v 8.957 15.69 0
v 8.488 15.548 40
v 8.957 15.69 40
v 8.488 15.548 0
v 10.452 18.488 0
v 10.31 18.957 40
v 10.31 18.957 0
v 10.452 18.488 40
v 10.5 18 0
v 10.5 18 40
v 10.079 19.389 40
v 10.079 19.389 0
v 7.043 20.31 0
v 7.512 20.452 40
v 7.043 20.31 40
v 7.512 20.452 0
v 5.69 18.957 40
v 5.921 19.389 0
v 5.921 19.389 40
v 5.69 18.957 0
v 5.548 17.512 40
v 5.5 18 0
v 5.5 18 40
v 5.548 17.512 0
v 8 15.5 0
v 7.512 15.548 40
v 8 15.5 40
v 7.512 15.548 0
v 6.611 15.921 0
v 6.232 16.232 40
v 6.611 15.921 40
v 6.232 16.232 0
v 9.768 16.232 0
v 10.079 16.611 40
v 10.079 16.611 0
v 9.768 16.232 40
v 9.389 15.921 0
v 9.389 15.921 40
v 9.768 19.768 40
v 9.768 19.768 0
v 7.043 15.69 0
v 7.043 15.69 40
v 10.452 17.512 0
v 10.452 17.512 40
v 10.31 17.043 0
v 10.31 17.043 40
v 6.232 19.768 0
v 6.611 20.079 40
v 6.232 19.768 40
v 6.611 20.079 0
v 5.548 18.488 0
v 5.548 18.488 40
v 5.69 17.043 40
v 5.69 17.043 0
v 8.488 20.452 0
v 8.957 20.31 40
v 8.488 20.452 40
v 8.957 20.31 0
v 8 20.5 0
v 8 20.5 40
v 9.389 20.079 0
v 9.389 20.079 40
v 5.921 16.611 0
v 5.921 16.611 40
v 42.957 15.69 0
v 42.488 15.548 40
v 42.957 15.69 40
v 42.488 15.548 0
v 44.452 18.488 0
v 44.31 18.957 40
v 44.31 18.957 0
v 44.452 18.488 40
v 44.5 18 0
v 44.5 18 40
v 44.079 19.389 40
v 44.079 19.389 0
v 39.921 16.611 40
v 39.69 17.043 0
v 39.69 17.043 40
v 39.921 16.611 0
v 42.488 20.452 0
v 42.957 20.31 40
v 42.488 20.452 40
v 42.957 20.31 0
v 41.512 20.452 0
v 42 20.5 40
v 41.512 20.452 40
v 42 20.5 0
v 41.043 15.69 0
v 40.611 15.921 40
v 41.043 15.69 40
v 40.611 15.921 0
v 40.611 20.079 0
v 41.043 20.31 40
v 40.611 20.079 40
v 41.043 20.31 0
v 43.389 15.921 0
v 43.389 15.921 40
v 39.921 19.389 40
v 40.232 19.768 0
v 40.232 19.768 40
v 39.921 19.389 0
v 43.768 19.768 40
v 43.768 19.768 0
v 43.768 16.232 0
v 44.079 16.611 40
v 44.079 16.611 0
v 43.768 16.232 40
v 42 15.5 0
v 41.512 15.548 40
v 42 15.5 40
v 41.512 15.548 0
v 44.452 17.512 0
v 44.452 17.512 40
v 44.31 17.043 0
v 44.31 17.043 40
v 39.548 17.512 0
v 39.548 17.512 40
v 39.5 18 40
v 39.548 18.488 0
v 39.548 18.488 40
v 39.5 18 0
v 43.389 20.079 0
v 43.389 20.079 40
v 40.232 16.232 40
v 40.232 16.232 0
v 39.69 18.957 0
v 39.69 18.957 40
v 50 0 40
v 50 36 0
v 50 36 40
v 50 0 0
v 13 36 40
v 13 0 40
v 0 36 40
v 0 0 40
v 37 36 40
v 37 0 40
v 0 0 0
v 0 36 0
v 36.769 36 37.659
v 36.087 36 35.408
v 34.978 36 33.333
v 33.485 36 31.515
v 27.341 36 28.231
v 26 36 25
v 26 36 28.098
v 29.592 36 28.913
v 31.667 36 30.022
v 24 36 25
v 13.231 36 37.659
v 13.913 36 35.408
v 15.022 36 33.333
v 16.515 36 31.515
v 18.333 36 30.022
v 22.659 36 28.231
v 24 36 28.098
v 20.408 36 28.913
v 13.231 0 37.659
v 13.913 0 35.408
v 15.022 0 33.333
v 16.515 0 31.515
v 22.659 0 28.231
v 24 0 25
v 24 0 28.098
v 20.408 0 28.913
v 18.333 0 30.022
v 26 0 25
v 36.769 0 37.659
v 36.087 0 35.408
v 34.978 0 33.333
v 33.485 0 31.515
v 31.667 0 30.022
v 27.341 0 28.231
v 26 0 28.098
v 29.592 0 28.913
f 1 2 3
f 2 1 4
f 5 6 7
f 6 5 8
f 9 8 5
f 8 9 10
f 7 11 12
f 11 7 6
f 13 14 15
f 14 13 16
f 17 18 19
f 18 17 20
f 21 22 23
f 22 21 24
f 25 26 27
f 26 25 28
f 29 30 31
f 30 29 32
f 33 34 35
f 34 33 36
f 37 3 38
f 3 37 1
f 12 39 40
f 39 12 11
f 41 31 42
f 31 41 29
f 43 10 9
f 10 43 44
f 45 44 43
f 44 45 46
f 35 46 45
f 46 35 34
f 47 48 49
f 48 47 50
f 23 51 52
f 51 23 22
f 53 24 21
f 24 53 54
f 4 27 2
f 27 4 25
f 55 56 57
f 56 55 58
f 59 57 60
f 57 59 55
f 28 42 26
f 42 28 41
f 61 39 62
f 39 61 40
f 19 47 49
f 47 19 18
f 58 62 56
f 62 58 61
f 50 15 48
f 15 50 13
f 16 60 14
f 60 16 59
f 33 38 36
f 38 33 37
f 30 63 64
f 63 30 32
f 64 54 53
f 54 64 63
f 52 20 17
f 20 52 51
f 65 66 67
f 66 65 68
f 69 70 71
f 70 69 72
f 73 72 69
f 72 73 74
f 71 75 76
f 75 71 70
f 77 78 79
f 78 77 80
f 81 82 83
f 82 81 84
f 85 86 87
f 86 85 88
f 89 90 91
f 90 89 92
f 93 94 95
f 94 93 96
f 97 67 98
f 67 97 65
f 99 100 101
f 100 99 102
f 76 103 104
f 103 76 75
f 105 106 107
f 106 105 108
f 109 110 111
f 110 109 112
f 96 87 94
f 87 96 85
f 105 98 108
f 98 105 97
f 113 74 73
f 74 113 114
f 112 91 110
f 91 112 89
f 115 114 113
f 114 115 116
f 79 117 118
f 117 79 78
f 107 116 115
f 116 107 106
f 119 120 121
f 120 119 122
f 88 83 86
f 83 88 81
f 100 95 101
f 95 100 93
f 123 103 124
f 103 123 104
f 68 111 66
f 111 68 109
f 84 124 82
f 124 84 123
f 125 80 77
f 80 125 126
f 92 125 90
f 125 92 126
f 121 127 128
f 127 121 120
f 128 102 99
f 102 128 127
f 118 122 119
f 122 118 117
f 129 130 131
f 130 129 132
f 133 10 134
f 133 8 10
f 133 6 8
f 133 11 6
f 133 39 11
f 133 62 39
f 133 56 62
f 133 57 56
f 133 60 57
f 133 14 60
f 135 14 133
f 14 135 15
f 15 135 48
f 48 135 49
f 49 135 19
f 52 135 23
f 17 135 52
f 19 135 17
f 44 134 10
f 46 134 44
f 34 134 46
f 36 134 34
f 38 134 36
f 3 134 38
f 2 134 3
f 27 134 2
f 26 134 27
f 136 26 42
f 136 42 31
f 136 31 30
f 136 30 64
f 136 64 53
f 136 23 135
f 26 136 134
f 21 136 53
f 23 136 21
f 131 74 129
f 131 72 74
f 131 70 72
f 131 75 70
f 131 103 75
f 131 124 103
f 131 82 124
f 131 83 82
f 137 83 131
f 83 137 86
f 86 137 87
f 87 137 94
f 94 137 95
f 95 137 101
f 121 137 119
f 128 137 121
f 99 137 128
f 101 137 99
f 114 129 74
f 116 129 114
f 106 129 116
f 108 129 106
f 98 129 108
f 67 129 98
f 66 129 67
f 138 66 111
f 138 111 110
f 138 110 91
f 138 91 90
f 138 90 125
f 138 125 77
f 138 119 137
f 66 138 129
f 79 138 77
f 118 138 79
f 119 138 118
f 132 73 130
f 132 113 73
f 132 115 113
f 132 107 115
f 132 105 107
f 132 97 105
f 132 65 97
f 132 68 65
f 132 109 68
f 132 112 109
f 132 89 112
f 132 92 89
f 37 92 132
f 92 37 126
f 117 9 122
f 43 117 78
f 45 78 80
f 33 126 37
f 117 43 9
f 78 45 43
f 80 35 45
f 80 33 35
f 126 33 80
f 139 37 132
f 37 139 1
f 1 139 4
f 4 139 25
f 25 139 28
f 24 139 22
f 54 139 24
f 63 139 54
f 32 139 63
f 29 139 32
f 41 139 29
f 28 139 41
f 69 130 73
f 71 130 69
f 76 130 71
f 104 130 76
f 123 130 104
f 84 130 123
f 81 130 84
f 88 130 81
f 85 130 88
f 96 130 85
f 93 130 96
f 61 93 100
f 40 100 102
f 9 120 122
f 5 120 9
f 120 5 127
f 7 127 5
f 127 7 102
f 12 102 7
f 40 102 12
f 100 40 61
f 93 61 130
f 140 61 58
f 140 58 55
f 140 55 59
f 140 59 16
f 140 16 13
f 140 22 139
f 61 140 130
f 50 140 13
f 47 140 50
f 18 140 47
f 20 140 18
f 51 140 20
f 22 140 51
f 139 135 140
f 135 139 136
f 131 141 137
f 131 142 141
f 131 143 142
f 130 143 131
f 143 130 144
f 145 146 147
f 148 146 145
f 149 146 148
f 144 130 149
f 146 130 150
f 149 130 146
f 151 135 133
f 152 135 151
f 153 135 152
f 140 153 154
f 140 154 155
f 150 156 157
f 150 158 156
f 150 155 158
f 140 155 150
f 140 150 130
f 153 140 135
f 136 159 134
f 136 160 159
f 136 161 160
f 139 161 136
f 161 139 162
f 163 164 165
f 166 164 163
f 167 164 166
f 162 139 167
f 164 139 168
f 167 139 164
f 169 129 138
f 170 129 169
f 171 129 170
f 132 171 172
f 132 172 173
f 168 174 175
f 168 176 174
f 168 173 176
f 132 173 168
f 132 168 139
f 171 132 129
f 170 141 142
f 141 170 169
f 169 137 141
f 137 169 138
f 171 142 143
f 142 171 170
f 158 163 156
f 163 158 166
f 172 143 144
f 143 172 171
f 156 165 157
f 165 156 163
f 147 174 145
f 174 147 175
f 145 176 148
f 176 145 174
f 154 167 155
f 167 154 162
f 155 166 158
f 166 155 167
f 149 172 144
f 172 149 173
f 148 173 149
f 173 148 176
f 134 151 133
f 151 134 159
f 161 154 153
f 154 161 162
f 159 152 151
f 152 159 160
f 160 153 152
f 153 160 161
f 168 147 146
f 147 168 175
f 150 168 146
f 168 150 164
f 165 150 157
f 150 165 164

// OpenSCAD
$fn = 32;

// ----------------------------------------------------------------------
// Saddle clamp: split shaft clamp
// ----------------------------------------------------------------------

// --- parameters (mm) ---
blk_l = 50;               // block length, X
blk_w = 36;               // block width, Y
blk_h = 40;               // block height
clamp_r = 12;             // shaft groove radius
hole_r = 2.5;             // bolt hole radius
hole_m = 8;               // bolt hole margin from the ends
saw_w = 2;                // saw kerf width

saw_depth = clamp_r + 3;  // saw kerf depth

difference() {
  cube([blk_l, blk_w, blk_h]);
  translate([blk_l / 2, -1, blk_h])
    rotate([-90, 0, 0])
      cylinder(h = blk_w + 2, r = clamp_r);
  for (sx = [0, 1])
    translate([sx ? blk_l - hole_m : hole_m, blk_w / 2, -1])
      cylinder(r = hole_r, h = blk_h + 2);
  translate([blk_l / 2 - saw_w / 2, -1, blk_h - saw_depth])
    cube([saw_w, blk_w + 2, saw_depth + 1]);
}
